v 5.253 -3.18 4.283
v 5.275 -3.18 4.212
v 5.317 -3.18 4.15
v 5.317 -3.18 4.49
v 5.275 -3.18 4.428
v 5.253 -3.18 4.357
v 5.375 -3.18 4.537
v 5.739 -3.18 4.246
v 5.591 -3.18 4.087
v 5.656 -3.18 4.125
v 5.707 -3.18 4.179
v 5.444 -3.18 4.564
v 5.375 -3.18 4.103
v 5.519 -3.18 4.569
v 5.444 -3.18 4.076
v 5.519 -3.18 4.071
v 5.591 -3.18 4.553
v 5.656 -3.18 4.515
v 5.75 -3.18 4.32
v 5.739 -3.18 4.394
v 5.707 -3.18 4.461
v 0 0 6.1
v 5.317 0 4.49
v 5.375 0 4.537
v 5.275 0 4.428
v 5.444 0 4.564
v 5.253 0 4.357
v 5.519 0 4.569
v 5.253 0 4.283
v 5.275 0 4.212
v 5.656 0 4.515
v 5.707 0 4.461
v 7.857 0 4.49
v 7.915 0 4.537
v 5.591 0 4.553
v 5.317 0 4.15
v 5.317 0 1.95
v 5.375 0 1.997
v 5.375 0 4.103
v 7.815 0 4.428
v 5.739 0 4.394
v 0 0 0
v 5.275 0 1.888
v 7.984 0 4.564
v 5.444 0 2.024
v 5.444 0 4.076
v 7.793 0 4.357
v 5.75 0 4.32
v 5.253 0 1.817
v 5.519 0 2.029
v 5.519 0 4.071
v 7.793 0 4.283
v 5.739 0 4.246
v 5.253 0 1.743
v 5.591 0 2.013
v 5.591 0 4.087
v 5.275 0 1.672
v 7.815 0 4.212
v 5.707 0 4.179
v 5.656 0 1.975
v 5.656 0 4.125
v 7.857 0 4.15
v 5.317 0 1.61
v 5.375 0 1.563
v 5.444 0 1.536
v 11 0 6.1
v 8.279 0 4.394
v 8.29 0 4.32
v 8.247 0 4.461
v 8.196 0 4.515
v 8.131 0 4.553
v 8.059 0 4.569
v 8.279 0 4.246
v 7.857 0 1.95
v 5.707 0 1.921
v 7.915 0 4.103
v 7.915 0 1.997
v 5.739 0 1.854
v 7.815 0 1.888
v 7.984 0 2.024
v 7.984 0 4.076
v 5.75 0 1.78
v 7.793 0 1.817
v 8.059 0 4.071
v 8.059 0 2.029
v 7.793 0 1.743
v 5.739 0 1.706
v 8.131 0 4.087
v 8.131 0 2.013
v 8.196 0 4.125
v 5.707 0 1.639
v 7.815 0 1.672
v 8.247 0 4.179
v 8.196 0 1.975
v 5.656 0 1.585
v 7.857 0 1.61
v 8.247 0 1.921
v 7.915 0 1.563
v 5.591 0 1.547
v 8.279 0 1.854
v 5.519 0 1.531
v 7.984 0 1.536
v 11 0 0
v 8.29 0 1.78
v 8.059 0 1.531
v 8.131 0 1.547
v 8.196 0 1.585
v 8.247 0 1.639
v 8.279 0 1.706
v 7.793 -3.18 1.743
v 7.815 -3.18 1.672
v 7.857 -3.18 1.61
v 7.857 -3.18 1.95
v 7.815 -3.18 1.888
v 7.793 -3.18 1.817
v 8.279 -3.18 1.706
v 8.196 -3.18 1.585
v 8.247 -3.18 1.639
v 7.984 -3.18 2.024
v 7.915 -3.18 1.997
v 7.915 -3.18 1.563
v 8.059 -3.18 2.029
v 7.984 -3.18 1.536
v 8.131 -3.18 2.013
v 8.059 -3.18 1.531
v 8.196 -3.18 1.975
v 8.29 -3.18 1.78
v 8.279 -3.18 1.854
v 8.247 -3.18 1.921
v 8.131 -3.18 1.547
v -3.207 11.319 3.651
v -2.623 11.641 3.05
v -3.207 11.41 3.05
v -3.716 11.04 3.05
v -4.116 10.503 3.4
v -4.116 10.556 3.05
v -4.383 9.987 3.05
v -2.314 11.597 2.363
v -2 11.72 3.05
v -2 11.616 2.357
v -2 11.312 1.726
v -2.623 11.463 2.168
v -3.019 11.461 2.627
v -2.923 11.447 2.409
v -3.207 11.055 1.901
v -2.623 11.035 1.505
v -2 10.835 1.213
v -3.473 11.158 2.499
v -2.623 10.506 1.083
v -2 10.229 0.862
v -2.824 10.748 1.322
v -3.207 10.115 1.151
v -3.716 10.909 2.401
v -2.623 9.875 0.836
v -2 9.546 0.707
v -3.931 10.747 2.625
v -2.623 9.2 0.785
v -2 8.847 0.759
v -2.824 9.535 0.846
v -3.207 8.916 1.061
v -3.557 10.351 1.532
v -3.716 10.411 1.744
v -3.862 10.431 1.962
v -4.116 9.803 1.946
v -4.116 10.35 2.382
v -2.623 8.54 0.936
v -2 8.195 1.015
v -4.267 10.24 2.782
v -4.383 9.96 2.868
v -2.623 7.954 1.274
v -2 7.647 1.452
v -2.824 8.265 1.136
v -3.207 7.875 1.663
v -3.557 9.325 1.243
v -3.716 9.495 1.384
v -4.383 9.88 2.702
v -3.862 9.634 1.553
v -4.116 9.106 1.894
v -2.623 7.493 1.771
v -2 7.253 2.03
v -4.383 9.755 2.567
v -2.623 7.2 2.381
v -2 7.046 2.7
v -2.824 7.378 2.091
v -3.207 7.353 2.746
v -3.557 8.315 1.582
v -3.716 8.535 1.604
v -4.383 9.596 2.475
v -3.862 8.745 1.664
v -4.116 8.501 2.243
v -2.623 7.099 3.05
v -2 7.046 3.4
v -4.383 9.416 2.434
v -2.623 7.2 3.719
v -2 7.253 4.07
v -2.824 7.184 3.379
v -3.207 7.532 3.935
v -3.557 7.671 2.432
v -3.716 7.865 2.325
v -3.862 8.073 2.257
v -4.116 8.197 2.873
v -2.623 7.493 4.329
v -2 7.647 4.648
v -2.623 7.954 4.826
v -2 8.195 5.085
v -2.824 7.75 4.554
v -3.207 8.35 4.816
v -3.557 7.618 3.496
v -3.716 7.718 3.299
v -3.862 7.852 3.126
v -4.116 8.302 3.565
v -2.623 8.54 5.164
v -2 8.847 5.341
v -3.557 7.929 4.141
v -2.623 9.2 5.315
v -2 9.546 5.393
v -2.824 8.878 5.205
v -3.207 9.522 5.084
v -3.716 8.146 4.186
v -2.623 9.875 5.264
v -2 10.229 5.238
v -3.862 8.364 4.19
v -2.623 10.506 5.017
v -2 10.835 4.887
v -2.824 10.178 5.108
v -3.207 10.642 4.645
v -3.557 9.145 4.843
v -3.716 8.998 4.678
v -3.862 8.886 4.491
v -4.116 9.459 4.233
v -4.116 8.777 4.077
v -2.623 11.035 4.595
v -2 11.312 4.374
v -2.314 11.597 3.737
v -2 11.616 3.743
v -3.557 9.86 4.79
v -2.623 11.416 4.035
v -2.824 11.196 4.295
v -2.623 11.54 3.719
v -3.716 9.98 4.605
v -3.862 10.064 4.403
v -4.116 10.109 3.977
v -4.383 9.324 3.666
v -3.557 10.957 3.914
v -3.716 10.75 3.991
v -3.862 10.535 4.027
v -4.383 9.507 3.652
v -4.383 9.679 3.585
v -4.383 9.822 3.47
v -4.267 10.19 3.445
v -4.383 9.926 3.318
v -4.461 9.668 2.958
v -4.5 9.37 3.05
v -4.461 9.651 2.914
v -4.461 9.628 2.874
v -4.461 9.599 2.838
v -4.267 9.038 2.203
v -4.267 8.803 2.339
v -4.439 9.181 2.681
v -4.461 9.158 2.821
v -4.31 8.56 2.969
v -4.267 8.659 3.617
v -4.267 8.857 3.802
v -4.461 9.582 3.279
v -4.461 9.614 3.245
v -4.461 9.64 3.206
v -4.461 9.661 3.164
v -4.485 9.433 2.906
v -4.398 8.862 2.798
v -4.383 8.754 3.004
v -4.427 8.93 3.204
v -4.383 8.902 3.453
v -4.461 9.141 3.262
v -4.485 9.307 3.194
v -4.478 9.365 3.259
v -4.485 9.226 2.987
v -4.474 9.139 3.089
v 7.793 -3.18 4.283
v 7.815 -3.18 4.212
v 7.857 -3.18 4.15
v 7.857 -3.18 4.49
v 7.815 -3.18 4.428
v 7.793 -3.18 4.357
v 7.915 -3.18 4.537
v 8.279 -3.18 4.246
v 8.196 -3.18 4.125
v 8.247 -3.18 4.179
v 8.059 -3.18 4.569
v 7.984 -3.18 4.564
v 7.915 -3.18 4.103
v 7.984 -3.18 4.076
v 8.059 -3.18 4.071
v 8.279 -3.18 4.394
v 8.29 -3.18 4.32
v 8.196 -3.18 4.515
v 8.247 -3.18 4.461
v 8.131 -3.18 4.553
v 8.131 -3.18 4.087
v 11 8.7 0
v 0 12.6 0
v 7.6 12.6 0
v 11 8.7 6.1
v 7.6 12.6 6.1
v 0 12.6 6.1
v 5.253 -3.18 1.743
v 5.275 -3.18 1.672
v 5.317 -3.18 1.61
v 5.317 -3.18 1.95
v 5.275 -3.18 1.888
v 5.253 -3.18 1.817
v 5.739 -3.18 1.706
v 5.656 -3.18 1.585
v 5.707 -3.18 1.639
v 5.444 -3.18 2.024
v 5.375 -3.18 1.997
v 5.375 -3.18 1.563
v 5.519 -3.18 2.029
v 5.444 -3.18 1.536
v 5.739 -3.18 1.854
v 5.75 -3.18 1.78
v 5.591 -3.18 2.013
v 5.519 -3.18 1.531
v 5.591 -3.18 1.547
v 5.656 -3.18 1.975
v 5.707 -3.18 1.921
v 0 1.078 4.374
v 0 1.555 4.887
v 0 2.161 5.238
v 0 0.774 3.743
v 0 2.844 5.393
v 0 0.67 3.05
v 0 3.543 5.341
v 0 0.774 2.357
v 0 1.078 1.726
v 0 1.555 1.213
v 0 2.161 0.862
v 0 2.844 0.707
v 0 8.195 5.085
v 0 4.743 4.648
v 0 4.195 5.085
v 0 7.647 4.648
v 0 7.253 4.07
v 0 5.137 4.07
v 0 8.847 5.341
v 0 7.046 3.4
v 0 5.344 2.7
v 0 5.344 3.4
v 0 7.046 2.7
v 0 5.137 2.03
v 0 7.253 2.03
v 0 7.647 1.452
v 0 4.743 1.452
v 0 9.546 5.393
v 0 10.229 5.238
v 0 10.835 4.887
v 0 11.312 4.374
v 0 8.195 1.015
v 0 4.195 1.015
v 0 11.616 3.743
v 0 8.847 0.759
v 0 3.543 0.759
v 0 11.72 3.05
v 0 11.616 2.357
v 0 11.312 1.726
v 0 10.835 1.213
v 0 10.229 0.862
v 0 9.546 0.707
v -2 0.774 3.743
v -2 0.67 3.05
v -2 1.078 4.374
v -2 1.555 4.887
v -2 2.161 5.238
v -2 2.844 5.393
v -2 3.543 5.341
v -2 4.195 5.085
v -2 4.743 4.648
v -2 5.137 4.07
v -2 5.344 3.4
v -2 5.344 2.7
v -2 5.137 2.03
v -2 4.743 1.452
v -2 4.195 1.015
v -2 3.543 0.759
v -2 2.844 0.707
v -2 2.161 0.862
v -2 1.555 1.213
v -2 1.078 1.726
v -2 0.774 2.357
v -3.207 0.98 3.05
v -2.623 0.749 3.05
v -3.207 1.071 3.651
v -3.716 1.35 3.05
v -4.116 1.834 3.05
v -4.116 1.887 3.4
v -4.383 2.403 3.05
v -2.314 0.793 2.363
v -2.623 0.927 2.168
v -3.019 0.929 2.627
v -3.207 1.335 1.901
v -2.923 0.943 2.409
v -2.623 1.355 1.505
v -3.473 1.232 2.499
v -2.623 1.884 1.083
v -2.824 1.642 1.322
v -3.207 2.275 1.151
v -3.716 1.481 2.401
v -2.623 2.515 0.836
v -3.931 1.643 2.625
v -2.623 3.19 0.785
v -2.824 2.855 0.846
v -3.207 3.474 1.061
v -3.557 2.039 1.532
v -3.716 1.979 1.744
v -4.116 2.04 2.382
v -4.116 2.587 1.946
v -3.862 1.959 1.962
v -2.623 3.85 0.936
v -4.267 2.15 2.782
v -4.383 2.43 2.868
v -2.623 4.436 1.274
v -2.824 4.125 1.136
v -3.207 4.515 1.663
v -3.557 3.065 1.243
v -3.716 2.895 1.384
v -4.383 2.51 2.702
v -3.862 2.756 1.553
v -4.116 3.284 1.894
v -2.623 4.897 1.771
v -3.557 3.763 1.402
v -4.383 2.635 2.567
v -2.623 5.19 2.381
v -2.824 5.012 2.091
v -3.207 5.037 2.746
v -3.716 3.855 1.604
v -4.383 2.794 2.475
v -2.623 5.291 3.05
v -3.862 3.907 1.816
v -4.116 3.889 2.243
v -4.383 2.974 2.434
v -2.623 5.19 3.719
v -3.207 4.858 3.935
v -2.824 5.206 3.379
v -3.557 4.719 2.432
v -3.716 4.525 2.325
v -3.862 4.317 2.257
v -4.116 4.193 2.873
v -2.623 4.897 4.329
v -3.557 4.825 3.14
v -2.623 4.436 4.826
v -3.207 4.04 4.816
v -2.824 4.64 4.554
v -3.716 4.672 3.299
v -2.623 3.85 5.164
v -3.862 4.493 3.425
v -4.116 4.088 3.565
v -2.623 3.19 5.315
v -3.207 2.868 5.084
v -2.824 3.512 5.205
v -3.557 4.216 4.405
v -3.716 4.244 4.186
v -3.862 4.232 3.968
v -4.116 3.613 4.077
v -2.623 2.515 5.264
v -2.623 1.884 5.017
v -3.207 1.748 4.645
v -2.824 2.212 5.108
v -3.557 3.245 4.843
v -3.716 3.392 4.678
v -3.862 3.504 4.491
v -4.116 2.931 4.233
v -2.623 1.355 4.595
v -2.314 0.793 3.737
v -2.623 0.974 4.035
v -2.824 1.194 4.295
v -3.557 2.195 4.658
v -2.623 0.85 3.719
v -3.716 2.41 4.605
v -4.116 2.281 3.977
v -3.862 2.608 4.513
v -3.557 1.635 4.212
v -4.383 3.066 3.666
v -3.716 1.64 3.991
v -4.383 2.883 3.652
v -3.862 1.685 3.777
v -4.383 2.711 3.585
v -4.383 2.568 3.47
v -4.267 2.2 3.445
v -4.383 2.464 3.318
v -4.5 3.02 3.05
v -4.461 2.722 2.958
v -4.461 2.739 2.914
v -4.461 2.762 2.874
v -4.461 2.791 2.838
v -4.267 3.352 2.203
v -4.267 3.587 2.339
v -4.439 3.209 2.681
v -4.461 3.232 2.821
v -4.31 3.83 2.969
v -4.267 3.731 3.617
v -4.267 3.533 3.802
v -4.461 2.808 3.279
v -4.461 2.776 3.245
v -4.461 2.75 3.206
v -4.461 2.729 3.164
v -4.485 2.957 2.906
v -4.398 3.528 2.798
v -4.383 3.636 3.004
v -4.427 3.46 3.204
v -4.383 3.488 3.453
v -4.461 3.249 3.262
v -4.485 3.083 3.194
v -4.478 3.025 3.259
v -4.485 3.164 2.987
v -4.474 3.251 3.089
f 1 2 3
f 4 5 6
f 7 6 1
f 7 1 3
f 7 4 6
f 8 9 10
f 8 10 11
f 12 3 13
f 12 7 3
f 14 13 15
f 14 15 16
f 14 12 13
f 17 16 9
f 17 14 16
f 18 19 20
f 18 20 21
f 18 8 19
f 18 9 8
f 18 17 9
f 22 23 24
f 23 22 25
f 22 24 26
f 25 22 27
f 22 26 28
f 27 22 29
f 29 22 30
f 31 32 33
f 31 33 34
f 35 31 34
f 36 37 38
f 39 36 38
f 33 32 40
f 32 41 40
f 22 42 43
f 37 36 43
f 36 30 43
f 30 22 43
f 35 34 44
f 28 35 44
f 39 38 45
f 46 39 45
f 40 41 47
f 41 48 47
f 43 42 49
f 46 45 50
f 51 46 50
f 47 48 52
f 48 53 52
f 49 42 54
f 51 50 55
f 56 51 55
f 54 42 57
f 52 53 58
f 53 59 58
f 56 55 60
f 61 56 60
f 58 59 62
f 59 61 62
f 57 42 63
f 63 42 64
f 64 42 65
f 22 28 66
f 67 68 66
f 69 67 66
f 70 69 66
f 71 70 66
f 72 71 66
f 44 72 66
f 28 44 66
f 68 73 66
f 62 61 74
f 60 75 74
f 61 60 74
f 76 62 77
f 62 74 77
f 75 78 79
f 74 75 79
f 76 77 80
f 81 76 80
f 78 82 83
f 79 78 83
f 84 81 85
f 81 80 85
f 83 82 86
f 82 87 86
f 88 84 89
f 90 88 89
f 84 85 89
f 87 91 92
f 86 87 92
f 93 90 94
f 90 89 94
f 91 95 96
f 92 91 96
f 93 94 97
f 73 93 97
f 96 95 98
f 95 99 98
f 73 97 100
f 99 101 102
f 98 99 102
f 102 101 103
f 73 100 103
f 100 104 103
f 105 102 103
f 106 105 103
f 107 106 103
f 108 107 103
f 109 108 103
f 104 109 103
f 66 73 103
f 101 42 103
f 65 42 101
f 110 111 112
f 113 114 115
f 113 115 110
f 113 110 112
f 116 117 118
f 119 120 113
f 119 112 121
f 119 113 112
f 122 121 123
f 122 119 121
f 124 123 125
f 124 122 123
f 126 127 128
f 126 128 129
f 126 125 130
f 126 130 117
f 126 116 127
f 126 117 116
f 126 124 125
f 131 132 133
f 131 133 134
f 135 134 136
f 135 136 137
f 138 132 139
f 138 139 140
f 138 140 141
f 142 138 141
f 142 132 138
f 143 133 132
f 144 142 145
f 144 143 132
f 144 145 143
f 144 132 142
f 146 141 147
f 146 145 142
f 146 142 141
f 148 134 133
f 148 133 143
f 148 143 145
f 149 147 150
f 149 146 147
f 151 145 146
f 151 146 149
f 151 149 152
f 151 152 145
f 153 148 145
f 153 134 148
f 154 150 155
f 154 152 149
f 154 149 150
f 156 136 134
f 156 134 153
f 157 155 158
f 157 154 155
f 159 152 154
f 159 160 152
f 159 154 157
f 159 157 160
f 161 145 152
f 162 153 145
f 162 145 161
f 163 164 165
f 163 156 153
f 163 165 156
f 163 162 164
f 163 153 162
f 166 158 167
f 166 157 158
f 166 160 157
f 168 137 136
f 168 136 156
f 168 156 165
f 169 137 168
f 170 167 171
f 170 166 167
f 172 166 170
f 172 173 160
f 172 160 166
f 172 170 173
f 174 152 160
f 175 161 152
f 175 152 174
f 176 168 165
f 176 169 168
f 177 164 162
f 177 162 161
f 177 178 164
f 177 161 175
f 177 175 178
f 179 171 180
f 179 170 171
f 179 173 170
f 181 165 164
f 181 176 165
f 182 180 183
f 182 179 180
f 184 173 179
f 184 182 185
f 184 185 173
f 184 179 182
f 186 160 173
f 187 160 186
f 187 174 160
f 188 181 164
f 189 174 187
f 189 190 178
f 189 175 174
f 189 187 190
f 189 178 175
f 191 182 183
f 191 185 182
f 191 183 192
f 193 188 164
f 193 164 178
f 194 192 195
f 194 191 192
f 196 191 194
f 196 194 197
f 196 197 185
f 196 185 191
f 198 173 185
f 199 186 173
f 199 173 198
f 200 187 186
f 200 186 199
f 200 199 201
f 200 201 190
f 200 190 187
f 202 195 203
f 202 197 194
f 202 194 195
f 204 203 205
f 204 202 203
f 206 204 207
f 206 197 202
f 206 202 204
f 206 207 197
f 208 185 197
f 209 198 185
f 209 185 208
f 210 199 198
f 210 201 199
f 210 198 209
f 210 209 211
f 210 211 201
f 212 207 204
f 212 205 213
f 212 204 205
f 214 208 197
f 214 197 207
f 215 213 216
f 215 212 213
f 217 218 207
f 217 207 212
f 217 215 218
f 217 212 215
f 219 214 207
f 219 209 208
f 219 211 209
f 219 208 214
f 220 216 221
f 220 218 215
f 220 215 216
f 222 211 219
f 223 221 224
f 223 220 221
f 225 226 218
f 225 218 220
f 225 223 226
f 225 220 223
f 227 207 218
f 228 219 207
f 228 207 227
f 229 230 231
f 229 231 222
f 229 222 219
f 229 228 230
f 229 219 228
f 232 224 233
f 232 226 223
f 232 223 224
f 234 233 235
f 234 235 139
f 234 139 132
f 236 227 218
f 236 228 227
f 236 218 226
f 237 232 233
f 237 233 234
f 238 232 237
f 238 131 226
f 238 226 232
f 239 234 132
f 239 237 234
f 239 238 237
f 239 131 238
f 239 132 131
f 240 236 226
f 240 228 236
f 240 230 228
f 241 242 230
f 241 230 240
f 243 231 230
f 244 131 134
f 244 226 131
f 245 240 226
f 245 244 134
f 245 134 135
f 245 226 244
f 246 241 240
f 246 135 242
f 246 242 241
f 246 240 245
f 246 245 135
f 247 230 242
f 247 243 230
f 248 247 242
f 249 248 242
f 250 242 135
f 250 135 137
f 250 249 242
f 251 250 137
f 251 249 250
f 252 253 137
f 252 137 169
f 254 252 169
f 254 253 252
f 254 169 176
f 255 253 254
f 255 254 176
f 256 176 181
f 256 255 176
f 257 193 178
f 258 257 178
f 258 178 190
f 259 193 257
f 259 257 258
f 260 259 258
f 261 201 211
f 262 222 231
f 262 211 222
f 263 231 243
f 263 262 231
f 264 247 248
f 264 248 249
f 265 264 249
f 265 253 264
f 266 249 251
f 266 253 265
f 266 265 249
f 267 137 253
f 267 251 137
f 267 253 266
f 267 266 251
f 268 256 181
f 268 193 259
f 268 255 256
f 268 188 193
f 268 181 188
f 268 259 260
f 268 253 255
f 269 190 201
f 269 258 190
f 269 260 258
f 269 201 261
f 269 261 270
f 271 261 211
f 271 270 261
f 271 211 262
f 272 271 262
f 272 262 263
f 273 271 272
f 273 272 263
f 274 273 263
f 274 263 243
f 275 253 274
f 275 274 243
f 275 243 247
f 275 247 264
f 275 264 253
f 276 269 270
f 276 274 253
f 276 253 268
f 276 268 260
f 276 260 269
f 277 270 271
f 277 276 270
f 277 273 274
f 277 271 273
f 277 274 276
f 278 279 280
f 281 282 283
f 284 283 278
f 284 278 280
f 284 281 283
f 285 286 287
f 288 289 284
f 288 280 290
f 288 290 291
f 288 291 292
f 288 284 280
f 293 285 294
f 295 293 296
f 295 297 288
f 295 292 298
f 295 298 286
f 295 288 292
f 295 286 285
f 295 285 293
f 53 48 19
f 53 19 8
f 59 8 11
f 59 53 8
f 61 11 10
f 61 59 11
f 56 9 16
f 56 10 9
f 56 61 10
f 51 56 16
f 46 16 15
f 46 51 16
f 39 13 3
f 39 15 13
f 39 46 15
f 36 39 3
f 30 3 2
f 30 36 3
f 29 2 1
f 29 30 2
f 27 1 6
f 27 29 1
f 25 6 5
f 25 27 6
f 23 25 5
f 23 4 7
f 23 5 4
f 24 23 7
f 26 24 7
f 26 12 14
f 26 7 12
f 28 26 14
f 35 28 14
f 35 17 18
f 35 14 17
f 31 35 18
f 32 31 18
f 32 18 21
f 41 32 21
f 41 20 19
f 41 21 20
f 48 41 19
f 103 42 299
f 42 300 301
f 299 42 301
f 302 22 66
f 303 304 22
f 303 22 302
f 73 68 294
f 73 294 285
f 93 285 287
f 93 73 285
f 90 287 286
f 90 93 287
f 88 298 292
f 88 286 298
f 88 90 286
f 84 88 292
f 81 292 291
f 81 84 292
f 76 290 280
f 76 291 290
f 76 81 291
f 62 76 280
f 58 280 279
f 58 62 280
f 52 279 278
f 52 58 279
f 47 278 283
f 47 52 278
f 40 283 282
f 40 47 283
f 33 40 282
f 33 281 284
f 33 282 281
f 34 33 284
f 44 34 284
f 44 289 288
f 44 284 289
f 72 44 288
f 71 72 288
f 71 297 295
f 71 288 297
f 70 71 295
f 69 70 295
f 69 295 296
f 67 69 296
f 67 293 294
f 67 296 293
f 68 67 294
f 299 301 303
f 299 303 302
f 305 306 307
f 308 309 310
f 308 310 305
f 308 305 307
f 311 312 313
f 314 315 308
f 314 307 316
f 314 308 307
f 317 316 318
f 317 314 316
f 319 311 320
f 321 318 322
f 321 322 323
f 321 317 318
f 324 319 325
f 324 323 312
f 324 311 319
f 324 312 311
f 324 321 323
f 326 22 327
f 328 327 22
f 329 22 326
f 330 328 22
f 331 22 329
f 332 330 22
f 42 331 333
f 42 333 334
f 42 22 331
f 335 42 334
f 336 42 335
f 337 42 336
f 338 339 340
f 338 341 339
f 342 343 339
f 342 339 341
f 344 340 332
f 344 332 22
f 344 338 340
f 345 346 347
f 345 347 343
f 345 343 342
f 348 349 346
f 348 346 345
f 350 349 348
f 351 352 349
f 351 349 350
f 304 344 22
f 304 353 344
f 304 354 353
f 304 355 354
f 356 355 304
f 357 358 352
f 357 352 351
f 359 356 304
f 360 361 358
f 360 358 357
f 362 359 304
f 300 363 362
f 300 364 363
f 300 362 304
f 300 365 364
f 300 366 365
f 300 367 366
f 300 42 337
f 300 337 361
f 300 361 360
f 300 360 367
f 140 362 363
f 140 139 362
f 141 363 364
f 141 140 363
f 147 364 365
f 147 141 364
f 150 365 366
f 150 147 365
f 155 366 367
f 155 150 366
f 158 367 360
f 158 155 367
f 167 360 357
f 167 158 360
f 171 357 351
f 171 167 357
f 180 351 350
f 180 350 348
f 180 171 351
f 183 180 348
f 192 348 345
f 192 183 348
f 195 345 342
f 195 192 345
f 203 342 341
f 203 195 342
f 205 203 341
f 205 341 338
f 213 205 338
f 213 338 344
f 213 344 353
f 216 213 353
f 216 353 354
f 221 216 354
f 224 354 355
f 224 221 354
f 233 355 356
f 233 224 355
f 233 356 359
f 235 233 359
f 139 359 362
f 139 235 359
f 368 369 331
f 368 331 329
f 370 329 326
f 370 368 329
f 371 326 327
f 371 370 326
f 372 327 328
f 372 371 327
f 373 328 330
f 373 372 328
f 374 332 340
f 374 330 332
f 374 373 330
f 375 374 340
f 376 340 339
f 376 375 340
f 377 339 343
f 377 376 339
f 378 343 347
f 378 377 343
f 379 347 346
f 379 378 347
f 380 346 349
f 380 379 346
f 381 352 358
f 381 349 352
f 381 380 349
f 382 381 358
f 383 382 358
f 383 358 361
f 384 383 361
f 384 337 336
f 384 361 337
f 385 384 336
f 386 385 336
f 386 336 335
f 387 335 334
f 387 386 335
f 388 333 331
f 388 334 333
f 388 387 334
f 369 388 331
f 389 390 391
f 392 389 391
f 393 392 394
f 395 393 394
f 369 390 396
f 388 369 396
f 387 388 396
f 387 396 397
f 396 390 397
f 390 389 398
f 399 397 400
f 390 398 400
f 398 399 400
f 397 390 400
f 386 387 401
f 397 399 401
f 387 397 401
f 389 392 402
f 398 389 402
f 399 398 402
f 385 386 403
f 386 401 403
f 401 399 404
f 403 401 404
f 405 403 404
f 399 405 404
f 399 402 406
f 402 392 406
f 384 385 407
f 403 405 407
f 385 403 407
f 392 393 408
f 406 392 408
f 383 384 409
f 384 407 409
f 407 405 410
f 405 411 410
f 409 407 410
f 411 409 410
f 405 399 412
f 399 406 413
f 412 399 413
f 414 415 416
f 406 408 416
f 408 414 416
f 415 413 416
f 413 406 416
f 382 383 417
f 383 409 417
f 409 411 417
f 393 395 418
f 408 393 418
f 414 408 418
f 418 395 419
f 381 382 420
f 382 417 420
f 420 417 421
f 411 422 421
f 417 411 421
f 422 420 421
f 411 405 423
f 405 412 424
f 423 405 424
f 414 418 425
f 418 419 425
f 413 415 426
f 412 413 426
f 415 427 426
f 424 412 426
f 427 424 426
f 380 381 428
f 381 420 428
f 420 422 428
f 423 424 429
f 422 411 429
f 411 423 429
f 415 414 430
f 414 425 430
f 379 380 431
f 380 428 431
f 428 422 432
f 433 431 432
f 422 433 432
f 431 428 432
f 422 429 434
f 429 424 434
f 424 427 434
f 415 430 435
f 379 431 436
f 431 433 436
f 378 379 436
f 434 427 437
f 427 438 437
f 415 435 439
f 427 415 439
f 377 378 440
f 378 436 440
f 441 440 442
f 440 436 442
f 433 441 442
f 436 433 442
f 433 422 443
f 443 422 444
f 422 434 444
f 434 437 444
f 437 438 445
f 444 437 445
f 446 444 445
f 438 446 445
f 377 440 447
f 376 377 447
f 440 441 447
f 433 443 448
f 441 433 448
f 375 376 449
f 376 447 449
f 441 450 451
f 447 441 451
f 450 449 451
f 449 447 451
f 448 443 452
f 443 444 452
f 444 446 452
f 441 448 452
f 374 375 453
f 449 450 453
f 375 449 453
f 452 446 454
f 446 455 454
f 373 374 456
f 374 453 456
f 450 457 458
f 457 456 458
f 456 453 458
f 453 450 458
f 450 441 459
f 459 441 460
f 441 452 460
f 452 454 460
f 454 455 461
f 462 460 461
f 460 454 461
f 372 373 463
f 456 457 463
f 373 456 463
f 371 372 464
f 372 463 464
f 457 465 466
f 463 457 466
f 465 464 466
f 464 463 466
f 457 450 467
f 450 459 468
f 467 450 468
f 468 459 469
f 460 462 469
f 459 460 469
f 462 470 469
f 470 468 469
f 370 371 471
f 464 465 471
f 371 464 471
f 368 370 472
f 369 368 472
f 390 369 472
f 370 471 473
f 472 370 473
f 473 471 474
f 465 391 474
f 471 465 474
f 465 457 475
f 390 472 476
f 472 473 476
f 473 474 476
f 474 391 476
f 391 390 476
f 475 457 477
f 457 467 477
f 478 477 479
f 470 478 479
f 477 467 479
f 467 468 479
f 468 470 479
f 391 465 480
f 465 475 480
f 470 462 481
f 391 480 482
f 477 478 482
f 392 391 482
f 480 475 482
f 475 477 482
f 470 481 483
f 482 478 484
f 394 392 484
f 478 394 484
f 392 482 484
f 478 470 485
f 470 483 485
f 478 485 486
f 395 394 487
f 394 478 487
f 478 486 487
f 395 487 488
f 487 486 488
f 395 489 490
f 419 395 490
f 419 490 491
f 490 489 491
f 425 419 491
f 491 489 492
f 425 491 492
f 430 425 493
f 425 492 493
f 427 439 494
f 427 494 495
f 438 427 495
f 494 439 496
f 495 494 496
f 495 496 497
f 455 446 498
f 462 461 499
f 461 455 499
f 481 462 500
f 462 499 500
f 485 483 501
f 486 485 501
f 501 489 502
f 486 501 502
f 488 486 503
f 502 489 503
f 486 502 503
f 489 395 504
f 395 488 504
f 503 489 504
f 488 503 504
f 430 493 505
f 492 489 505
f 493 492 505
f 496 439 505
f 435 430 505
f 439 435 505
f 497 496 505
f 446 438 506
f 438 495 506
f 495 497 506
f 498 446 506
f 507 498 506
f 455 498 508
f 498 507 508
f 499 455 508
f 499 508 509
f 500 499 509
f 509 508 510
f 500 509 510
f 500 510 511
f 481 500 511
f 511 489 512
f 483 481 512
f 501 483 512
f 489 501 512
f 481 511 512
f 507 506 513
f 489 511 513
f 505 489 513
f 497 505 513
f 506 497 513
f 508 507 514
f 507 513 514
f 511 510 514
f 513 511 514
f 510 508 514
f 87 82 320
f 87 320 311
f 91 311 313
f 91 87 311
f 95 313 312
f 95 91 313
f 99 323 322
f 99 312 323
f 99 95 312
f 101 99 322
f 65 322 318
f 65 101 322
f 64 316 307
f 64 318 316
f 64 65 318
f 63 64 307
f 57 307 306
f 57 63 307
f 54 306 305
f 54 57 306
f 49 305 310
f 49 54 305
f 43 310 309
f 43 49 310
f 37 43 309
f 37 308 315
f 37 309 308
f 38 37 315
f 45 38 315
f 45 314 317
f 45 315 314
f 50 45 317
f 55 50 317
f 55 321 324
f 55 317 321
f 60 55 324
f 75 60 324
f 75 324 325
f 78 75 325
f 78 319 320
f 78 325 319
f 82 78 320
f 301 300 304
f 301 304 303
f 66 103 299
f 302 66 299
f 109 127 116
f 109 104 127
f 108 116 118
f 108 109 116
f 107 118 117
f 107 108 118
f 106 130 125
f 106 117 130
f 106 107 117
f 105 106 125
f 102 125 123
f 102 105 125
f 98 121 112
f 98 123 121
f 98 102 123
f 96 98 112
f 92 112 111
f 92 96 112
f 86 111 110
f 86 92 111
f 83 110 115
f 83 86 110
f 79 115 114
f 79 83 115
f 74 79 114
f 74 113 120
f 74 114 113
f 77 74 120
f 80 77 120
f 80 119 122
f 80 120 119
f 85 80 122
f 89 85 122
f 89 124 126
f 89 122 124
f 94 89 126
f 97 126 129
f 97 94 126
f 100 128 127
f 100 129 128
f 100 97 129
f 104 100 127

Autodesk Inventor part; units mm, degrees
ref_plane "YZ Plane" through (0, 0, 0) normal (1, 0, 0) x (0, 1, 0)
sketch "Sketch1" plane through (0, 0, 0) normal (0, 0, 1) x (1, 0, 0)
  line L0 (0, 0) -> (11, 0)
  line L1 (11, 0) -> (11, 8.7)
  line L2 (0, 0) -> (0, 12.6)
  line L3 (0, 12.6) -> (7.6, 12.6)
  line L4 (7.6, 12.6) -> (11, 8.7)
  dimension "d0" = 11
  dimension "d1" = 8.7
  dimension "d2" = 12.6
  dimension "d3" = 7.6
extrude "Extrusion1" add sketch "Sketch1" along normal blind 6.1
ref_plane "Work Plane1" through (0, 0, 3.05) normal (0, 0, 1) x (1, 0, 0)
sketch "Sketch2" plane through (0, 0, 3.05) normal (0, 0, 1) x (1, 0, 0)
  line L0 (0, 12.6) -> (0, 0) projected
  line L1 (0, 9.37) -> (-4.5, 9.37)
  line L2 (7.6, 12.6) -> (0, 12.6) projected
  line L3 (0, 11.72) -> (-2, 11.72)
  arc A0 (-2, 11.72) -> (-4.5, 9.37) centre (-2, 9.2152) ccw
  line L4 (0, 9.37) -> (0, 11.72)
  line L5 (0, 12.6) -> (0, 0) projected
  dimension "d6" = 3.23
  dimension "d7" = 4.5
  dimension "d8" = 2.35
  dimension "d10" = 2
revolve "Revolution1" add sketch "Sketch2" angle 360 about axis through (0, 9.37, 3.05) along (-1, 0, 0)
ref_plane "Work Plane2" through (0, 6.195, 0) normal (0, 1, 0) x (1, 0, 0)
mirror "Mirror1" about plane through (0, 6.195, 0) normal (0, 1, 0) of "Revolution1"
sketch "Sketch3" plane through (0, 0, 0) normal (0, -1, 0) x (1, 0, 0)
  circle A0 centre (5.5, 1.78) radius 0.25
  line L0 (0, 0) -> (0, 6.1) projected
  line L1 (0, 0) -> (11, 0) construction
  line L2 (0, 0) -> (11, 0)
  circle A1 centre (8.04, 1.78) radius 0.25
  line L3 (2.54, 0) -> (13.54, 0)
  circle A2 centre (5.5, 4.32) radius 0.25
  line L4 (0, 2.54) -> (11, 2.54)
  circle A3 centre (8.04, 4.32) radius 0.25
  line L5 (2.54, 2.54) -> (13.54, 2.54)
  point P0 (0, 3.05)
  point P1 (0, 3.05)
  dimension "d13" = 5.5
  dimension "d15" = 1.27
  dimension "d16" = 0.5
  dimension "d19" = 2.54
  dimension "d22" = 2.54
extrude "Extrusion2" add sketch "Sketch3" along normal blind 3.18
properties part number "SSF-LXHM250GGD"
